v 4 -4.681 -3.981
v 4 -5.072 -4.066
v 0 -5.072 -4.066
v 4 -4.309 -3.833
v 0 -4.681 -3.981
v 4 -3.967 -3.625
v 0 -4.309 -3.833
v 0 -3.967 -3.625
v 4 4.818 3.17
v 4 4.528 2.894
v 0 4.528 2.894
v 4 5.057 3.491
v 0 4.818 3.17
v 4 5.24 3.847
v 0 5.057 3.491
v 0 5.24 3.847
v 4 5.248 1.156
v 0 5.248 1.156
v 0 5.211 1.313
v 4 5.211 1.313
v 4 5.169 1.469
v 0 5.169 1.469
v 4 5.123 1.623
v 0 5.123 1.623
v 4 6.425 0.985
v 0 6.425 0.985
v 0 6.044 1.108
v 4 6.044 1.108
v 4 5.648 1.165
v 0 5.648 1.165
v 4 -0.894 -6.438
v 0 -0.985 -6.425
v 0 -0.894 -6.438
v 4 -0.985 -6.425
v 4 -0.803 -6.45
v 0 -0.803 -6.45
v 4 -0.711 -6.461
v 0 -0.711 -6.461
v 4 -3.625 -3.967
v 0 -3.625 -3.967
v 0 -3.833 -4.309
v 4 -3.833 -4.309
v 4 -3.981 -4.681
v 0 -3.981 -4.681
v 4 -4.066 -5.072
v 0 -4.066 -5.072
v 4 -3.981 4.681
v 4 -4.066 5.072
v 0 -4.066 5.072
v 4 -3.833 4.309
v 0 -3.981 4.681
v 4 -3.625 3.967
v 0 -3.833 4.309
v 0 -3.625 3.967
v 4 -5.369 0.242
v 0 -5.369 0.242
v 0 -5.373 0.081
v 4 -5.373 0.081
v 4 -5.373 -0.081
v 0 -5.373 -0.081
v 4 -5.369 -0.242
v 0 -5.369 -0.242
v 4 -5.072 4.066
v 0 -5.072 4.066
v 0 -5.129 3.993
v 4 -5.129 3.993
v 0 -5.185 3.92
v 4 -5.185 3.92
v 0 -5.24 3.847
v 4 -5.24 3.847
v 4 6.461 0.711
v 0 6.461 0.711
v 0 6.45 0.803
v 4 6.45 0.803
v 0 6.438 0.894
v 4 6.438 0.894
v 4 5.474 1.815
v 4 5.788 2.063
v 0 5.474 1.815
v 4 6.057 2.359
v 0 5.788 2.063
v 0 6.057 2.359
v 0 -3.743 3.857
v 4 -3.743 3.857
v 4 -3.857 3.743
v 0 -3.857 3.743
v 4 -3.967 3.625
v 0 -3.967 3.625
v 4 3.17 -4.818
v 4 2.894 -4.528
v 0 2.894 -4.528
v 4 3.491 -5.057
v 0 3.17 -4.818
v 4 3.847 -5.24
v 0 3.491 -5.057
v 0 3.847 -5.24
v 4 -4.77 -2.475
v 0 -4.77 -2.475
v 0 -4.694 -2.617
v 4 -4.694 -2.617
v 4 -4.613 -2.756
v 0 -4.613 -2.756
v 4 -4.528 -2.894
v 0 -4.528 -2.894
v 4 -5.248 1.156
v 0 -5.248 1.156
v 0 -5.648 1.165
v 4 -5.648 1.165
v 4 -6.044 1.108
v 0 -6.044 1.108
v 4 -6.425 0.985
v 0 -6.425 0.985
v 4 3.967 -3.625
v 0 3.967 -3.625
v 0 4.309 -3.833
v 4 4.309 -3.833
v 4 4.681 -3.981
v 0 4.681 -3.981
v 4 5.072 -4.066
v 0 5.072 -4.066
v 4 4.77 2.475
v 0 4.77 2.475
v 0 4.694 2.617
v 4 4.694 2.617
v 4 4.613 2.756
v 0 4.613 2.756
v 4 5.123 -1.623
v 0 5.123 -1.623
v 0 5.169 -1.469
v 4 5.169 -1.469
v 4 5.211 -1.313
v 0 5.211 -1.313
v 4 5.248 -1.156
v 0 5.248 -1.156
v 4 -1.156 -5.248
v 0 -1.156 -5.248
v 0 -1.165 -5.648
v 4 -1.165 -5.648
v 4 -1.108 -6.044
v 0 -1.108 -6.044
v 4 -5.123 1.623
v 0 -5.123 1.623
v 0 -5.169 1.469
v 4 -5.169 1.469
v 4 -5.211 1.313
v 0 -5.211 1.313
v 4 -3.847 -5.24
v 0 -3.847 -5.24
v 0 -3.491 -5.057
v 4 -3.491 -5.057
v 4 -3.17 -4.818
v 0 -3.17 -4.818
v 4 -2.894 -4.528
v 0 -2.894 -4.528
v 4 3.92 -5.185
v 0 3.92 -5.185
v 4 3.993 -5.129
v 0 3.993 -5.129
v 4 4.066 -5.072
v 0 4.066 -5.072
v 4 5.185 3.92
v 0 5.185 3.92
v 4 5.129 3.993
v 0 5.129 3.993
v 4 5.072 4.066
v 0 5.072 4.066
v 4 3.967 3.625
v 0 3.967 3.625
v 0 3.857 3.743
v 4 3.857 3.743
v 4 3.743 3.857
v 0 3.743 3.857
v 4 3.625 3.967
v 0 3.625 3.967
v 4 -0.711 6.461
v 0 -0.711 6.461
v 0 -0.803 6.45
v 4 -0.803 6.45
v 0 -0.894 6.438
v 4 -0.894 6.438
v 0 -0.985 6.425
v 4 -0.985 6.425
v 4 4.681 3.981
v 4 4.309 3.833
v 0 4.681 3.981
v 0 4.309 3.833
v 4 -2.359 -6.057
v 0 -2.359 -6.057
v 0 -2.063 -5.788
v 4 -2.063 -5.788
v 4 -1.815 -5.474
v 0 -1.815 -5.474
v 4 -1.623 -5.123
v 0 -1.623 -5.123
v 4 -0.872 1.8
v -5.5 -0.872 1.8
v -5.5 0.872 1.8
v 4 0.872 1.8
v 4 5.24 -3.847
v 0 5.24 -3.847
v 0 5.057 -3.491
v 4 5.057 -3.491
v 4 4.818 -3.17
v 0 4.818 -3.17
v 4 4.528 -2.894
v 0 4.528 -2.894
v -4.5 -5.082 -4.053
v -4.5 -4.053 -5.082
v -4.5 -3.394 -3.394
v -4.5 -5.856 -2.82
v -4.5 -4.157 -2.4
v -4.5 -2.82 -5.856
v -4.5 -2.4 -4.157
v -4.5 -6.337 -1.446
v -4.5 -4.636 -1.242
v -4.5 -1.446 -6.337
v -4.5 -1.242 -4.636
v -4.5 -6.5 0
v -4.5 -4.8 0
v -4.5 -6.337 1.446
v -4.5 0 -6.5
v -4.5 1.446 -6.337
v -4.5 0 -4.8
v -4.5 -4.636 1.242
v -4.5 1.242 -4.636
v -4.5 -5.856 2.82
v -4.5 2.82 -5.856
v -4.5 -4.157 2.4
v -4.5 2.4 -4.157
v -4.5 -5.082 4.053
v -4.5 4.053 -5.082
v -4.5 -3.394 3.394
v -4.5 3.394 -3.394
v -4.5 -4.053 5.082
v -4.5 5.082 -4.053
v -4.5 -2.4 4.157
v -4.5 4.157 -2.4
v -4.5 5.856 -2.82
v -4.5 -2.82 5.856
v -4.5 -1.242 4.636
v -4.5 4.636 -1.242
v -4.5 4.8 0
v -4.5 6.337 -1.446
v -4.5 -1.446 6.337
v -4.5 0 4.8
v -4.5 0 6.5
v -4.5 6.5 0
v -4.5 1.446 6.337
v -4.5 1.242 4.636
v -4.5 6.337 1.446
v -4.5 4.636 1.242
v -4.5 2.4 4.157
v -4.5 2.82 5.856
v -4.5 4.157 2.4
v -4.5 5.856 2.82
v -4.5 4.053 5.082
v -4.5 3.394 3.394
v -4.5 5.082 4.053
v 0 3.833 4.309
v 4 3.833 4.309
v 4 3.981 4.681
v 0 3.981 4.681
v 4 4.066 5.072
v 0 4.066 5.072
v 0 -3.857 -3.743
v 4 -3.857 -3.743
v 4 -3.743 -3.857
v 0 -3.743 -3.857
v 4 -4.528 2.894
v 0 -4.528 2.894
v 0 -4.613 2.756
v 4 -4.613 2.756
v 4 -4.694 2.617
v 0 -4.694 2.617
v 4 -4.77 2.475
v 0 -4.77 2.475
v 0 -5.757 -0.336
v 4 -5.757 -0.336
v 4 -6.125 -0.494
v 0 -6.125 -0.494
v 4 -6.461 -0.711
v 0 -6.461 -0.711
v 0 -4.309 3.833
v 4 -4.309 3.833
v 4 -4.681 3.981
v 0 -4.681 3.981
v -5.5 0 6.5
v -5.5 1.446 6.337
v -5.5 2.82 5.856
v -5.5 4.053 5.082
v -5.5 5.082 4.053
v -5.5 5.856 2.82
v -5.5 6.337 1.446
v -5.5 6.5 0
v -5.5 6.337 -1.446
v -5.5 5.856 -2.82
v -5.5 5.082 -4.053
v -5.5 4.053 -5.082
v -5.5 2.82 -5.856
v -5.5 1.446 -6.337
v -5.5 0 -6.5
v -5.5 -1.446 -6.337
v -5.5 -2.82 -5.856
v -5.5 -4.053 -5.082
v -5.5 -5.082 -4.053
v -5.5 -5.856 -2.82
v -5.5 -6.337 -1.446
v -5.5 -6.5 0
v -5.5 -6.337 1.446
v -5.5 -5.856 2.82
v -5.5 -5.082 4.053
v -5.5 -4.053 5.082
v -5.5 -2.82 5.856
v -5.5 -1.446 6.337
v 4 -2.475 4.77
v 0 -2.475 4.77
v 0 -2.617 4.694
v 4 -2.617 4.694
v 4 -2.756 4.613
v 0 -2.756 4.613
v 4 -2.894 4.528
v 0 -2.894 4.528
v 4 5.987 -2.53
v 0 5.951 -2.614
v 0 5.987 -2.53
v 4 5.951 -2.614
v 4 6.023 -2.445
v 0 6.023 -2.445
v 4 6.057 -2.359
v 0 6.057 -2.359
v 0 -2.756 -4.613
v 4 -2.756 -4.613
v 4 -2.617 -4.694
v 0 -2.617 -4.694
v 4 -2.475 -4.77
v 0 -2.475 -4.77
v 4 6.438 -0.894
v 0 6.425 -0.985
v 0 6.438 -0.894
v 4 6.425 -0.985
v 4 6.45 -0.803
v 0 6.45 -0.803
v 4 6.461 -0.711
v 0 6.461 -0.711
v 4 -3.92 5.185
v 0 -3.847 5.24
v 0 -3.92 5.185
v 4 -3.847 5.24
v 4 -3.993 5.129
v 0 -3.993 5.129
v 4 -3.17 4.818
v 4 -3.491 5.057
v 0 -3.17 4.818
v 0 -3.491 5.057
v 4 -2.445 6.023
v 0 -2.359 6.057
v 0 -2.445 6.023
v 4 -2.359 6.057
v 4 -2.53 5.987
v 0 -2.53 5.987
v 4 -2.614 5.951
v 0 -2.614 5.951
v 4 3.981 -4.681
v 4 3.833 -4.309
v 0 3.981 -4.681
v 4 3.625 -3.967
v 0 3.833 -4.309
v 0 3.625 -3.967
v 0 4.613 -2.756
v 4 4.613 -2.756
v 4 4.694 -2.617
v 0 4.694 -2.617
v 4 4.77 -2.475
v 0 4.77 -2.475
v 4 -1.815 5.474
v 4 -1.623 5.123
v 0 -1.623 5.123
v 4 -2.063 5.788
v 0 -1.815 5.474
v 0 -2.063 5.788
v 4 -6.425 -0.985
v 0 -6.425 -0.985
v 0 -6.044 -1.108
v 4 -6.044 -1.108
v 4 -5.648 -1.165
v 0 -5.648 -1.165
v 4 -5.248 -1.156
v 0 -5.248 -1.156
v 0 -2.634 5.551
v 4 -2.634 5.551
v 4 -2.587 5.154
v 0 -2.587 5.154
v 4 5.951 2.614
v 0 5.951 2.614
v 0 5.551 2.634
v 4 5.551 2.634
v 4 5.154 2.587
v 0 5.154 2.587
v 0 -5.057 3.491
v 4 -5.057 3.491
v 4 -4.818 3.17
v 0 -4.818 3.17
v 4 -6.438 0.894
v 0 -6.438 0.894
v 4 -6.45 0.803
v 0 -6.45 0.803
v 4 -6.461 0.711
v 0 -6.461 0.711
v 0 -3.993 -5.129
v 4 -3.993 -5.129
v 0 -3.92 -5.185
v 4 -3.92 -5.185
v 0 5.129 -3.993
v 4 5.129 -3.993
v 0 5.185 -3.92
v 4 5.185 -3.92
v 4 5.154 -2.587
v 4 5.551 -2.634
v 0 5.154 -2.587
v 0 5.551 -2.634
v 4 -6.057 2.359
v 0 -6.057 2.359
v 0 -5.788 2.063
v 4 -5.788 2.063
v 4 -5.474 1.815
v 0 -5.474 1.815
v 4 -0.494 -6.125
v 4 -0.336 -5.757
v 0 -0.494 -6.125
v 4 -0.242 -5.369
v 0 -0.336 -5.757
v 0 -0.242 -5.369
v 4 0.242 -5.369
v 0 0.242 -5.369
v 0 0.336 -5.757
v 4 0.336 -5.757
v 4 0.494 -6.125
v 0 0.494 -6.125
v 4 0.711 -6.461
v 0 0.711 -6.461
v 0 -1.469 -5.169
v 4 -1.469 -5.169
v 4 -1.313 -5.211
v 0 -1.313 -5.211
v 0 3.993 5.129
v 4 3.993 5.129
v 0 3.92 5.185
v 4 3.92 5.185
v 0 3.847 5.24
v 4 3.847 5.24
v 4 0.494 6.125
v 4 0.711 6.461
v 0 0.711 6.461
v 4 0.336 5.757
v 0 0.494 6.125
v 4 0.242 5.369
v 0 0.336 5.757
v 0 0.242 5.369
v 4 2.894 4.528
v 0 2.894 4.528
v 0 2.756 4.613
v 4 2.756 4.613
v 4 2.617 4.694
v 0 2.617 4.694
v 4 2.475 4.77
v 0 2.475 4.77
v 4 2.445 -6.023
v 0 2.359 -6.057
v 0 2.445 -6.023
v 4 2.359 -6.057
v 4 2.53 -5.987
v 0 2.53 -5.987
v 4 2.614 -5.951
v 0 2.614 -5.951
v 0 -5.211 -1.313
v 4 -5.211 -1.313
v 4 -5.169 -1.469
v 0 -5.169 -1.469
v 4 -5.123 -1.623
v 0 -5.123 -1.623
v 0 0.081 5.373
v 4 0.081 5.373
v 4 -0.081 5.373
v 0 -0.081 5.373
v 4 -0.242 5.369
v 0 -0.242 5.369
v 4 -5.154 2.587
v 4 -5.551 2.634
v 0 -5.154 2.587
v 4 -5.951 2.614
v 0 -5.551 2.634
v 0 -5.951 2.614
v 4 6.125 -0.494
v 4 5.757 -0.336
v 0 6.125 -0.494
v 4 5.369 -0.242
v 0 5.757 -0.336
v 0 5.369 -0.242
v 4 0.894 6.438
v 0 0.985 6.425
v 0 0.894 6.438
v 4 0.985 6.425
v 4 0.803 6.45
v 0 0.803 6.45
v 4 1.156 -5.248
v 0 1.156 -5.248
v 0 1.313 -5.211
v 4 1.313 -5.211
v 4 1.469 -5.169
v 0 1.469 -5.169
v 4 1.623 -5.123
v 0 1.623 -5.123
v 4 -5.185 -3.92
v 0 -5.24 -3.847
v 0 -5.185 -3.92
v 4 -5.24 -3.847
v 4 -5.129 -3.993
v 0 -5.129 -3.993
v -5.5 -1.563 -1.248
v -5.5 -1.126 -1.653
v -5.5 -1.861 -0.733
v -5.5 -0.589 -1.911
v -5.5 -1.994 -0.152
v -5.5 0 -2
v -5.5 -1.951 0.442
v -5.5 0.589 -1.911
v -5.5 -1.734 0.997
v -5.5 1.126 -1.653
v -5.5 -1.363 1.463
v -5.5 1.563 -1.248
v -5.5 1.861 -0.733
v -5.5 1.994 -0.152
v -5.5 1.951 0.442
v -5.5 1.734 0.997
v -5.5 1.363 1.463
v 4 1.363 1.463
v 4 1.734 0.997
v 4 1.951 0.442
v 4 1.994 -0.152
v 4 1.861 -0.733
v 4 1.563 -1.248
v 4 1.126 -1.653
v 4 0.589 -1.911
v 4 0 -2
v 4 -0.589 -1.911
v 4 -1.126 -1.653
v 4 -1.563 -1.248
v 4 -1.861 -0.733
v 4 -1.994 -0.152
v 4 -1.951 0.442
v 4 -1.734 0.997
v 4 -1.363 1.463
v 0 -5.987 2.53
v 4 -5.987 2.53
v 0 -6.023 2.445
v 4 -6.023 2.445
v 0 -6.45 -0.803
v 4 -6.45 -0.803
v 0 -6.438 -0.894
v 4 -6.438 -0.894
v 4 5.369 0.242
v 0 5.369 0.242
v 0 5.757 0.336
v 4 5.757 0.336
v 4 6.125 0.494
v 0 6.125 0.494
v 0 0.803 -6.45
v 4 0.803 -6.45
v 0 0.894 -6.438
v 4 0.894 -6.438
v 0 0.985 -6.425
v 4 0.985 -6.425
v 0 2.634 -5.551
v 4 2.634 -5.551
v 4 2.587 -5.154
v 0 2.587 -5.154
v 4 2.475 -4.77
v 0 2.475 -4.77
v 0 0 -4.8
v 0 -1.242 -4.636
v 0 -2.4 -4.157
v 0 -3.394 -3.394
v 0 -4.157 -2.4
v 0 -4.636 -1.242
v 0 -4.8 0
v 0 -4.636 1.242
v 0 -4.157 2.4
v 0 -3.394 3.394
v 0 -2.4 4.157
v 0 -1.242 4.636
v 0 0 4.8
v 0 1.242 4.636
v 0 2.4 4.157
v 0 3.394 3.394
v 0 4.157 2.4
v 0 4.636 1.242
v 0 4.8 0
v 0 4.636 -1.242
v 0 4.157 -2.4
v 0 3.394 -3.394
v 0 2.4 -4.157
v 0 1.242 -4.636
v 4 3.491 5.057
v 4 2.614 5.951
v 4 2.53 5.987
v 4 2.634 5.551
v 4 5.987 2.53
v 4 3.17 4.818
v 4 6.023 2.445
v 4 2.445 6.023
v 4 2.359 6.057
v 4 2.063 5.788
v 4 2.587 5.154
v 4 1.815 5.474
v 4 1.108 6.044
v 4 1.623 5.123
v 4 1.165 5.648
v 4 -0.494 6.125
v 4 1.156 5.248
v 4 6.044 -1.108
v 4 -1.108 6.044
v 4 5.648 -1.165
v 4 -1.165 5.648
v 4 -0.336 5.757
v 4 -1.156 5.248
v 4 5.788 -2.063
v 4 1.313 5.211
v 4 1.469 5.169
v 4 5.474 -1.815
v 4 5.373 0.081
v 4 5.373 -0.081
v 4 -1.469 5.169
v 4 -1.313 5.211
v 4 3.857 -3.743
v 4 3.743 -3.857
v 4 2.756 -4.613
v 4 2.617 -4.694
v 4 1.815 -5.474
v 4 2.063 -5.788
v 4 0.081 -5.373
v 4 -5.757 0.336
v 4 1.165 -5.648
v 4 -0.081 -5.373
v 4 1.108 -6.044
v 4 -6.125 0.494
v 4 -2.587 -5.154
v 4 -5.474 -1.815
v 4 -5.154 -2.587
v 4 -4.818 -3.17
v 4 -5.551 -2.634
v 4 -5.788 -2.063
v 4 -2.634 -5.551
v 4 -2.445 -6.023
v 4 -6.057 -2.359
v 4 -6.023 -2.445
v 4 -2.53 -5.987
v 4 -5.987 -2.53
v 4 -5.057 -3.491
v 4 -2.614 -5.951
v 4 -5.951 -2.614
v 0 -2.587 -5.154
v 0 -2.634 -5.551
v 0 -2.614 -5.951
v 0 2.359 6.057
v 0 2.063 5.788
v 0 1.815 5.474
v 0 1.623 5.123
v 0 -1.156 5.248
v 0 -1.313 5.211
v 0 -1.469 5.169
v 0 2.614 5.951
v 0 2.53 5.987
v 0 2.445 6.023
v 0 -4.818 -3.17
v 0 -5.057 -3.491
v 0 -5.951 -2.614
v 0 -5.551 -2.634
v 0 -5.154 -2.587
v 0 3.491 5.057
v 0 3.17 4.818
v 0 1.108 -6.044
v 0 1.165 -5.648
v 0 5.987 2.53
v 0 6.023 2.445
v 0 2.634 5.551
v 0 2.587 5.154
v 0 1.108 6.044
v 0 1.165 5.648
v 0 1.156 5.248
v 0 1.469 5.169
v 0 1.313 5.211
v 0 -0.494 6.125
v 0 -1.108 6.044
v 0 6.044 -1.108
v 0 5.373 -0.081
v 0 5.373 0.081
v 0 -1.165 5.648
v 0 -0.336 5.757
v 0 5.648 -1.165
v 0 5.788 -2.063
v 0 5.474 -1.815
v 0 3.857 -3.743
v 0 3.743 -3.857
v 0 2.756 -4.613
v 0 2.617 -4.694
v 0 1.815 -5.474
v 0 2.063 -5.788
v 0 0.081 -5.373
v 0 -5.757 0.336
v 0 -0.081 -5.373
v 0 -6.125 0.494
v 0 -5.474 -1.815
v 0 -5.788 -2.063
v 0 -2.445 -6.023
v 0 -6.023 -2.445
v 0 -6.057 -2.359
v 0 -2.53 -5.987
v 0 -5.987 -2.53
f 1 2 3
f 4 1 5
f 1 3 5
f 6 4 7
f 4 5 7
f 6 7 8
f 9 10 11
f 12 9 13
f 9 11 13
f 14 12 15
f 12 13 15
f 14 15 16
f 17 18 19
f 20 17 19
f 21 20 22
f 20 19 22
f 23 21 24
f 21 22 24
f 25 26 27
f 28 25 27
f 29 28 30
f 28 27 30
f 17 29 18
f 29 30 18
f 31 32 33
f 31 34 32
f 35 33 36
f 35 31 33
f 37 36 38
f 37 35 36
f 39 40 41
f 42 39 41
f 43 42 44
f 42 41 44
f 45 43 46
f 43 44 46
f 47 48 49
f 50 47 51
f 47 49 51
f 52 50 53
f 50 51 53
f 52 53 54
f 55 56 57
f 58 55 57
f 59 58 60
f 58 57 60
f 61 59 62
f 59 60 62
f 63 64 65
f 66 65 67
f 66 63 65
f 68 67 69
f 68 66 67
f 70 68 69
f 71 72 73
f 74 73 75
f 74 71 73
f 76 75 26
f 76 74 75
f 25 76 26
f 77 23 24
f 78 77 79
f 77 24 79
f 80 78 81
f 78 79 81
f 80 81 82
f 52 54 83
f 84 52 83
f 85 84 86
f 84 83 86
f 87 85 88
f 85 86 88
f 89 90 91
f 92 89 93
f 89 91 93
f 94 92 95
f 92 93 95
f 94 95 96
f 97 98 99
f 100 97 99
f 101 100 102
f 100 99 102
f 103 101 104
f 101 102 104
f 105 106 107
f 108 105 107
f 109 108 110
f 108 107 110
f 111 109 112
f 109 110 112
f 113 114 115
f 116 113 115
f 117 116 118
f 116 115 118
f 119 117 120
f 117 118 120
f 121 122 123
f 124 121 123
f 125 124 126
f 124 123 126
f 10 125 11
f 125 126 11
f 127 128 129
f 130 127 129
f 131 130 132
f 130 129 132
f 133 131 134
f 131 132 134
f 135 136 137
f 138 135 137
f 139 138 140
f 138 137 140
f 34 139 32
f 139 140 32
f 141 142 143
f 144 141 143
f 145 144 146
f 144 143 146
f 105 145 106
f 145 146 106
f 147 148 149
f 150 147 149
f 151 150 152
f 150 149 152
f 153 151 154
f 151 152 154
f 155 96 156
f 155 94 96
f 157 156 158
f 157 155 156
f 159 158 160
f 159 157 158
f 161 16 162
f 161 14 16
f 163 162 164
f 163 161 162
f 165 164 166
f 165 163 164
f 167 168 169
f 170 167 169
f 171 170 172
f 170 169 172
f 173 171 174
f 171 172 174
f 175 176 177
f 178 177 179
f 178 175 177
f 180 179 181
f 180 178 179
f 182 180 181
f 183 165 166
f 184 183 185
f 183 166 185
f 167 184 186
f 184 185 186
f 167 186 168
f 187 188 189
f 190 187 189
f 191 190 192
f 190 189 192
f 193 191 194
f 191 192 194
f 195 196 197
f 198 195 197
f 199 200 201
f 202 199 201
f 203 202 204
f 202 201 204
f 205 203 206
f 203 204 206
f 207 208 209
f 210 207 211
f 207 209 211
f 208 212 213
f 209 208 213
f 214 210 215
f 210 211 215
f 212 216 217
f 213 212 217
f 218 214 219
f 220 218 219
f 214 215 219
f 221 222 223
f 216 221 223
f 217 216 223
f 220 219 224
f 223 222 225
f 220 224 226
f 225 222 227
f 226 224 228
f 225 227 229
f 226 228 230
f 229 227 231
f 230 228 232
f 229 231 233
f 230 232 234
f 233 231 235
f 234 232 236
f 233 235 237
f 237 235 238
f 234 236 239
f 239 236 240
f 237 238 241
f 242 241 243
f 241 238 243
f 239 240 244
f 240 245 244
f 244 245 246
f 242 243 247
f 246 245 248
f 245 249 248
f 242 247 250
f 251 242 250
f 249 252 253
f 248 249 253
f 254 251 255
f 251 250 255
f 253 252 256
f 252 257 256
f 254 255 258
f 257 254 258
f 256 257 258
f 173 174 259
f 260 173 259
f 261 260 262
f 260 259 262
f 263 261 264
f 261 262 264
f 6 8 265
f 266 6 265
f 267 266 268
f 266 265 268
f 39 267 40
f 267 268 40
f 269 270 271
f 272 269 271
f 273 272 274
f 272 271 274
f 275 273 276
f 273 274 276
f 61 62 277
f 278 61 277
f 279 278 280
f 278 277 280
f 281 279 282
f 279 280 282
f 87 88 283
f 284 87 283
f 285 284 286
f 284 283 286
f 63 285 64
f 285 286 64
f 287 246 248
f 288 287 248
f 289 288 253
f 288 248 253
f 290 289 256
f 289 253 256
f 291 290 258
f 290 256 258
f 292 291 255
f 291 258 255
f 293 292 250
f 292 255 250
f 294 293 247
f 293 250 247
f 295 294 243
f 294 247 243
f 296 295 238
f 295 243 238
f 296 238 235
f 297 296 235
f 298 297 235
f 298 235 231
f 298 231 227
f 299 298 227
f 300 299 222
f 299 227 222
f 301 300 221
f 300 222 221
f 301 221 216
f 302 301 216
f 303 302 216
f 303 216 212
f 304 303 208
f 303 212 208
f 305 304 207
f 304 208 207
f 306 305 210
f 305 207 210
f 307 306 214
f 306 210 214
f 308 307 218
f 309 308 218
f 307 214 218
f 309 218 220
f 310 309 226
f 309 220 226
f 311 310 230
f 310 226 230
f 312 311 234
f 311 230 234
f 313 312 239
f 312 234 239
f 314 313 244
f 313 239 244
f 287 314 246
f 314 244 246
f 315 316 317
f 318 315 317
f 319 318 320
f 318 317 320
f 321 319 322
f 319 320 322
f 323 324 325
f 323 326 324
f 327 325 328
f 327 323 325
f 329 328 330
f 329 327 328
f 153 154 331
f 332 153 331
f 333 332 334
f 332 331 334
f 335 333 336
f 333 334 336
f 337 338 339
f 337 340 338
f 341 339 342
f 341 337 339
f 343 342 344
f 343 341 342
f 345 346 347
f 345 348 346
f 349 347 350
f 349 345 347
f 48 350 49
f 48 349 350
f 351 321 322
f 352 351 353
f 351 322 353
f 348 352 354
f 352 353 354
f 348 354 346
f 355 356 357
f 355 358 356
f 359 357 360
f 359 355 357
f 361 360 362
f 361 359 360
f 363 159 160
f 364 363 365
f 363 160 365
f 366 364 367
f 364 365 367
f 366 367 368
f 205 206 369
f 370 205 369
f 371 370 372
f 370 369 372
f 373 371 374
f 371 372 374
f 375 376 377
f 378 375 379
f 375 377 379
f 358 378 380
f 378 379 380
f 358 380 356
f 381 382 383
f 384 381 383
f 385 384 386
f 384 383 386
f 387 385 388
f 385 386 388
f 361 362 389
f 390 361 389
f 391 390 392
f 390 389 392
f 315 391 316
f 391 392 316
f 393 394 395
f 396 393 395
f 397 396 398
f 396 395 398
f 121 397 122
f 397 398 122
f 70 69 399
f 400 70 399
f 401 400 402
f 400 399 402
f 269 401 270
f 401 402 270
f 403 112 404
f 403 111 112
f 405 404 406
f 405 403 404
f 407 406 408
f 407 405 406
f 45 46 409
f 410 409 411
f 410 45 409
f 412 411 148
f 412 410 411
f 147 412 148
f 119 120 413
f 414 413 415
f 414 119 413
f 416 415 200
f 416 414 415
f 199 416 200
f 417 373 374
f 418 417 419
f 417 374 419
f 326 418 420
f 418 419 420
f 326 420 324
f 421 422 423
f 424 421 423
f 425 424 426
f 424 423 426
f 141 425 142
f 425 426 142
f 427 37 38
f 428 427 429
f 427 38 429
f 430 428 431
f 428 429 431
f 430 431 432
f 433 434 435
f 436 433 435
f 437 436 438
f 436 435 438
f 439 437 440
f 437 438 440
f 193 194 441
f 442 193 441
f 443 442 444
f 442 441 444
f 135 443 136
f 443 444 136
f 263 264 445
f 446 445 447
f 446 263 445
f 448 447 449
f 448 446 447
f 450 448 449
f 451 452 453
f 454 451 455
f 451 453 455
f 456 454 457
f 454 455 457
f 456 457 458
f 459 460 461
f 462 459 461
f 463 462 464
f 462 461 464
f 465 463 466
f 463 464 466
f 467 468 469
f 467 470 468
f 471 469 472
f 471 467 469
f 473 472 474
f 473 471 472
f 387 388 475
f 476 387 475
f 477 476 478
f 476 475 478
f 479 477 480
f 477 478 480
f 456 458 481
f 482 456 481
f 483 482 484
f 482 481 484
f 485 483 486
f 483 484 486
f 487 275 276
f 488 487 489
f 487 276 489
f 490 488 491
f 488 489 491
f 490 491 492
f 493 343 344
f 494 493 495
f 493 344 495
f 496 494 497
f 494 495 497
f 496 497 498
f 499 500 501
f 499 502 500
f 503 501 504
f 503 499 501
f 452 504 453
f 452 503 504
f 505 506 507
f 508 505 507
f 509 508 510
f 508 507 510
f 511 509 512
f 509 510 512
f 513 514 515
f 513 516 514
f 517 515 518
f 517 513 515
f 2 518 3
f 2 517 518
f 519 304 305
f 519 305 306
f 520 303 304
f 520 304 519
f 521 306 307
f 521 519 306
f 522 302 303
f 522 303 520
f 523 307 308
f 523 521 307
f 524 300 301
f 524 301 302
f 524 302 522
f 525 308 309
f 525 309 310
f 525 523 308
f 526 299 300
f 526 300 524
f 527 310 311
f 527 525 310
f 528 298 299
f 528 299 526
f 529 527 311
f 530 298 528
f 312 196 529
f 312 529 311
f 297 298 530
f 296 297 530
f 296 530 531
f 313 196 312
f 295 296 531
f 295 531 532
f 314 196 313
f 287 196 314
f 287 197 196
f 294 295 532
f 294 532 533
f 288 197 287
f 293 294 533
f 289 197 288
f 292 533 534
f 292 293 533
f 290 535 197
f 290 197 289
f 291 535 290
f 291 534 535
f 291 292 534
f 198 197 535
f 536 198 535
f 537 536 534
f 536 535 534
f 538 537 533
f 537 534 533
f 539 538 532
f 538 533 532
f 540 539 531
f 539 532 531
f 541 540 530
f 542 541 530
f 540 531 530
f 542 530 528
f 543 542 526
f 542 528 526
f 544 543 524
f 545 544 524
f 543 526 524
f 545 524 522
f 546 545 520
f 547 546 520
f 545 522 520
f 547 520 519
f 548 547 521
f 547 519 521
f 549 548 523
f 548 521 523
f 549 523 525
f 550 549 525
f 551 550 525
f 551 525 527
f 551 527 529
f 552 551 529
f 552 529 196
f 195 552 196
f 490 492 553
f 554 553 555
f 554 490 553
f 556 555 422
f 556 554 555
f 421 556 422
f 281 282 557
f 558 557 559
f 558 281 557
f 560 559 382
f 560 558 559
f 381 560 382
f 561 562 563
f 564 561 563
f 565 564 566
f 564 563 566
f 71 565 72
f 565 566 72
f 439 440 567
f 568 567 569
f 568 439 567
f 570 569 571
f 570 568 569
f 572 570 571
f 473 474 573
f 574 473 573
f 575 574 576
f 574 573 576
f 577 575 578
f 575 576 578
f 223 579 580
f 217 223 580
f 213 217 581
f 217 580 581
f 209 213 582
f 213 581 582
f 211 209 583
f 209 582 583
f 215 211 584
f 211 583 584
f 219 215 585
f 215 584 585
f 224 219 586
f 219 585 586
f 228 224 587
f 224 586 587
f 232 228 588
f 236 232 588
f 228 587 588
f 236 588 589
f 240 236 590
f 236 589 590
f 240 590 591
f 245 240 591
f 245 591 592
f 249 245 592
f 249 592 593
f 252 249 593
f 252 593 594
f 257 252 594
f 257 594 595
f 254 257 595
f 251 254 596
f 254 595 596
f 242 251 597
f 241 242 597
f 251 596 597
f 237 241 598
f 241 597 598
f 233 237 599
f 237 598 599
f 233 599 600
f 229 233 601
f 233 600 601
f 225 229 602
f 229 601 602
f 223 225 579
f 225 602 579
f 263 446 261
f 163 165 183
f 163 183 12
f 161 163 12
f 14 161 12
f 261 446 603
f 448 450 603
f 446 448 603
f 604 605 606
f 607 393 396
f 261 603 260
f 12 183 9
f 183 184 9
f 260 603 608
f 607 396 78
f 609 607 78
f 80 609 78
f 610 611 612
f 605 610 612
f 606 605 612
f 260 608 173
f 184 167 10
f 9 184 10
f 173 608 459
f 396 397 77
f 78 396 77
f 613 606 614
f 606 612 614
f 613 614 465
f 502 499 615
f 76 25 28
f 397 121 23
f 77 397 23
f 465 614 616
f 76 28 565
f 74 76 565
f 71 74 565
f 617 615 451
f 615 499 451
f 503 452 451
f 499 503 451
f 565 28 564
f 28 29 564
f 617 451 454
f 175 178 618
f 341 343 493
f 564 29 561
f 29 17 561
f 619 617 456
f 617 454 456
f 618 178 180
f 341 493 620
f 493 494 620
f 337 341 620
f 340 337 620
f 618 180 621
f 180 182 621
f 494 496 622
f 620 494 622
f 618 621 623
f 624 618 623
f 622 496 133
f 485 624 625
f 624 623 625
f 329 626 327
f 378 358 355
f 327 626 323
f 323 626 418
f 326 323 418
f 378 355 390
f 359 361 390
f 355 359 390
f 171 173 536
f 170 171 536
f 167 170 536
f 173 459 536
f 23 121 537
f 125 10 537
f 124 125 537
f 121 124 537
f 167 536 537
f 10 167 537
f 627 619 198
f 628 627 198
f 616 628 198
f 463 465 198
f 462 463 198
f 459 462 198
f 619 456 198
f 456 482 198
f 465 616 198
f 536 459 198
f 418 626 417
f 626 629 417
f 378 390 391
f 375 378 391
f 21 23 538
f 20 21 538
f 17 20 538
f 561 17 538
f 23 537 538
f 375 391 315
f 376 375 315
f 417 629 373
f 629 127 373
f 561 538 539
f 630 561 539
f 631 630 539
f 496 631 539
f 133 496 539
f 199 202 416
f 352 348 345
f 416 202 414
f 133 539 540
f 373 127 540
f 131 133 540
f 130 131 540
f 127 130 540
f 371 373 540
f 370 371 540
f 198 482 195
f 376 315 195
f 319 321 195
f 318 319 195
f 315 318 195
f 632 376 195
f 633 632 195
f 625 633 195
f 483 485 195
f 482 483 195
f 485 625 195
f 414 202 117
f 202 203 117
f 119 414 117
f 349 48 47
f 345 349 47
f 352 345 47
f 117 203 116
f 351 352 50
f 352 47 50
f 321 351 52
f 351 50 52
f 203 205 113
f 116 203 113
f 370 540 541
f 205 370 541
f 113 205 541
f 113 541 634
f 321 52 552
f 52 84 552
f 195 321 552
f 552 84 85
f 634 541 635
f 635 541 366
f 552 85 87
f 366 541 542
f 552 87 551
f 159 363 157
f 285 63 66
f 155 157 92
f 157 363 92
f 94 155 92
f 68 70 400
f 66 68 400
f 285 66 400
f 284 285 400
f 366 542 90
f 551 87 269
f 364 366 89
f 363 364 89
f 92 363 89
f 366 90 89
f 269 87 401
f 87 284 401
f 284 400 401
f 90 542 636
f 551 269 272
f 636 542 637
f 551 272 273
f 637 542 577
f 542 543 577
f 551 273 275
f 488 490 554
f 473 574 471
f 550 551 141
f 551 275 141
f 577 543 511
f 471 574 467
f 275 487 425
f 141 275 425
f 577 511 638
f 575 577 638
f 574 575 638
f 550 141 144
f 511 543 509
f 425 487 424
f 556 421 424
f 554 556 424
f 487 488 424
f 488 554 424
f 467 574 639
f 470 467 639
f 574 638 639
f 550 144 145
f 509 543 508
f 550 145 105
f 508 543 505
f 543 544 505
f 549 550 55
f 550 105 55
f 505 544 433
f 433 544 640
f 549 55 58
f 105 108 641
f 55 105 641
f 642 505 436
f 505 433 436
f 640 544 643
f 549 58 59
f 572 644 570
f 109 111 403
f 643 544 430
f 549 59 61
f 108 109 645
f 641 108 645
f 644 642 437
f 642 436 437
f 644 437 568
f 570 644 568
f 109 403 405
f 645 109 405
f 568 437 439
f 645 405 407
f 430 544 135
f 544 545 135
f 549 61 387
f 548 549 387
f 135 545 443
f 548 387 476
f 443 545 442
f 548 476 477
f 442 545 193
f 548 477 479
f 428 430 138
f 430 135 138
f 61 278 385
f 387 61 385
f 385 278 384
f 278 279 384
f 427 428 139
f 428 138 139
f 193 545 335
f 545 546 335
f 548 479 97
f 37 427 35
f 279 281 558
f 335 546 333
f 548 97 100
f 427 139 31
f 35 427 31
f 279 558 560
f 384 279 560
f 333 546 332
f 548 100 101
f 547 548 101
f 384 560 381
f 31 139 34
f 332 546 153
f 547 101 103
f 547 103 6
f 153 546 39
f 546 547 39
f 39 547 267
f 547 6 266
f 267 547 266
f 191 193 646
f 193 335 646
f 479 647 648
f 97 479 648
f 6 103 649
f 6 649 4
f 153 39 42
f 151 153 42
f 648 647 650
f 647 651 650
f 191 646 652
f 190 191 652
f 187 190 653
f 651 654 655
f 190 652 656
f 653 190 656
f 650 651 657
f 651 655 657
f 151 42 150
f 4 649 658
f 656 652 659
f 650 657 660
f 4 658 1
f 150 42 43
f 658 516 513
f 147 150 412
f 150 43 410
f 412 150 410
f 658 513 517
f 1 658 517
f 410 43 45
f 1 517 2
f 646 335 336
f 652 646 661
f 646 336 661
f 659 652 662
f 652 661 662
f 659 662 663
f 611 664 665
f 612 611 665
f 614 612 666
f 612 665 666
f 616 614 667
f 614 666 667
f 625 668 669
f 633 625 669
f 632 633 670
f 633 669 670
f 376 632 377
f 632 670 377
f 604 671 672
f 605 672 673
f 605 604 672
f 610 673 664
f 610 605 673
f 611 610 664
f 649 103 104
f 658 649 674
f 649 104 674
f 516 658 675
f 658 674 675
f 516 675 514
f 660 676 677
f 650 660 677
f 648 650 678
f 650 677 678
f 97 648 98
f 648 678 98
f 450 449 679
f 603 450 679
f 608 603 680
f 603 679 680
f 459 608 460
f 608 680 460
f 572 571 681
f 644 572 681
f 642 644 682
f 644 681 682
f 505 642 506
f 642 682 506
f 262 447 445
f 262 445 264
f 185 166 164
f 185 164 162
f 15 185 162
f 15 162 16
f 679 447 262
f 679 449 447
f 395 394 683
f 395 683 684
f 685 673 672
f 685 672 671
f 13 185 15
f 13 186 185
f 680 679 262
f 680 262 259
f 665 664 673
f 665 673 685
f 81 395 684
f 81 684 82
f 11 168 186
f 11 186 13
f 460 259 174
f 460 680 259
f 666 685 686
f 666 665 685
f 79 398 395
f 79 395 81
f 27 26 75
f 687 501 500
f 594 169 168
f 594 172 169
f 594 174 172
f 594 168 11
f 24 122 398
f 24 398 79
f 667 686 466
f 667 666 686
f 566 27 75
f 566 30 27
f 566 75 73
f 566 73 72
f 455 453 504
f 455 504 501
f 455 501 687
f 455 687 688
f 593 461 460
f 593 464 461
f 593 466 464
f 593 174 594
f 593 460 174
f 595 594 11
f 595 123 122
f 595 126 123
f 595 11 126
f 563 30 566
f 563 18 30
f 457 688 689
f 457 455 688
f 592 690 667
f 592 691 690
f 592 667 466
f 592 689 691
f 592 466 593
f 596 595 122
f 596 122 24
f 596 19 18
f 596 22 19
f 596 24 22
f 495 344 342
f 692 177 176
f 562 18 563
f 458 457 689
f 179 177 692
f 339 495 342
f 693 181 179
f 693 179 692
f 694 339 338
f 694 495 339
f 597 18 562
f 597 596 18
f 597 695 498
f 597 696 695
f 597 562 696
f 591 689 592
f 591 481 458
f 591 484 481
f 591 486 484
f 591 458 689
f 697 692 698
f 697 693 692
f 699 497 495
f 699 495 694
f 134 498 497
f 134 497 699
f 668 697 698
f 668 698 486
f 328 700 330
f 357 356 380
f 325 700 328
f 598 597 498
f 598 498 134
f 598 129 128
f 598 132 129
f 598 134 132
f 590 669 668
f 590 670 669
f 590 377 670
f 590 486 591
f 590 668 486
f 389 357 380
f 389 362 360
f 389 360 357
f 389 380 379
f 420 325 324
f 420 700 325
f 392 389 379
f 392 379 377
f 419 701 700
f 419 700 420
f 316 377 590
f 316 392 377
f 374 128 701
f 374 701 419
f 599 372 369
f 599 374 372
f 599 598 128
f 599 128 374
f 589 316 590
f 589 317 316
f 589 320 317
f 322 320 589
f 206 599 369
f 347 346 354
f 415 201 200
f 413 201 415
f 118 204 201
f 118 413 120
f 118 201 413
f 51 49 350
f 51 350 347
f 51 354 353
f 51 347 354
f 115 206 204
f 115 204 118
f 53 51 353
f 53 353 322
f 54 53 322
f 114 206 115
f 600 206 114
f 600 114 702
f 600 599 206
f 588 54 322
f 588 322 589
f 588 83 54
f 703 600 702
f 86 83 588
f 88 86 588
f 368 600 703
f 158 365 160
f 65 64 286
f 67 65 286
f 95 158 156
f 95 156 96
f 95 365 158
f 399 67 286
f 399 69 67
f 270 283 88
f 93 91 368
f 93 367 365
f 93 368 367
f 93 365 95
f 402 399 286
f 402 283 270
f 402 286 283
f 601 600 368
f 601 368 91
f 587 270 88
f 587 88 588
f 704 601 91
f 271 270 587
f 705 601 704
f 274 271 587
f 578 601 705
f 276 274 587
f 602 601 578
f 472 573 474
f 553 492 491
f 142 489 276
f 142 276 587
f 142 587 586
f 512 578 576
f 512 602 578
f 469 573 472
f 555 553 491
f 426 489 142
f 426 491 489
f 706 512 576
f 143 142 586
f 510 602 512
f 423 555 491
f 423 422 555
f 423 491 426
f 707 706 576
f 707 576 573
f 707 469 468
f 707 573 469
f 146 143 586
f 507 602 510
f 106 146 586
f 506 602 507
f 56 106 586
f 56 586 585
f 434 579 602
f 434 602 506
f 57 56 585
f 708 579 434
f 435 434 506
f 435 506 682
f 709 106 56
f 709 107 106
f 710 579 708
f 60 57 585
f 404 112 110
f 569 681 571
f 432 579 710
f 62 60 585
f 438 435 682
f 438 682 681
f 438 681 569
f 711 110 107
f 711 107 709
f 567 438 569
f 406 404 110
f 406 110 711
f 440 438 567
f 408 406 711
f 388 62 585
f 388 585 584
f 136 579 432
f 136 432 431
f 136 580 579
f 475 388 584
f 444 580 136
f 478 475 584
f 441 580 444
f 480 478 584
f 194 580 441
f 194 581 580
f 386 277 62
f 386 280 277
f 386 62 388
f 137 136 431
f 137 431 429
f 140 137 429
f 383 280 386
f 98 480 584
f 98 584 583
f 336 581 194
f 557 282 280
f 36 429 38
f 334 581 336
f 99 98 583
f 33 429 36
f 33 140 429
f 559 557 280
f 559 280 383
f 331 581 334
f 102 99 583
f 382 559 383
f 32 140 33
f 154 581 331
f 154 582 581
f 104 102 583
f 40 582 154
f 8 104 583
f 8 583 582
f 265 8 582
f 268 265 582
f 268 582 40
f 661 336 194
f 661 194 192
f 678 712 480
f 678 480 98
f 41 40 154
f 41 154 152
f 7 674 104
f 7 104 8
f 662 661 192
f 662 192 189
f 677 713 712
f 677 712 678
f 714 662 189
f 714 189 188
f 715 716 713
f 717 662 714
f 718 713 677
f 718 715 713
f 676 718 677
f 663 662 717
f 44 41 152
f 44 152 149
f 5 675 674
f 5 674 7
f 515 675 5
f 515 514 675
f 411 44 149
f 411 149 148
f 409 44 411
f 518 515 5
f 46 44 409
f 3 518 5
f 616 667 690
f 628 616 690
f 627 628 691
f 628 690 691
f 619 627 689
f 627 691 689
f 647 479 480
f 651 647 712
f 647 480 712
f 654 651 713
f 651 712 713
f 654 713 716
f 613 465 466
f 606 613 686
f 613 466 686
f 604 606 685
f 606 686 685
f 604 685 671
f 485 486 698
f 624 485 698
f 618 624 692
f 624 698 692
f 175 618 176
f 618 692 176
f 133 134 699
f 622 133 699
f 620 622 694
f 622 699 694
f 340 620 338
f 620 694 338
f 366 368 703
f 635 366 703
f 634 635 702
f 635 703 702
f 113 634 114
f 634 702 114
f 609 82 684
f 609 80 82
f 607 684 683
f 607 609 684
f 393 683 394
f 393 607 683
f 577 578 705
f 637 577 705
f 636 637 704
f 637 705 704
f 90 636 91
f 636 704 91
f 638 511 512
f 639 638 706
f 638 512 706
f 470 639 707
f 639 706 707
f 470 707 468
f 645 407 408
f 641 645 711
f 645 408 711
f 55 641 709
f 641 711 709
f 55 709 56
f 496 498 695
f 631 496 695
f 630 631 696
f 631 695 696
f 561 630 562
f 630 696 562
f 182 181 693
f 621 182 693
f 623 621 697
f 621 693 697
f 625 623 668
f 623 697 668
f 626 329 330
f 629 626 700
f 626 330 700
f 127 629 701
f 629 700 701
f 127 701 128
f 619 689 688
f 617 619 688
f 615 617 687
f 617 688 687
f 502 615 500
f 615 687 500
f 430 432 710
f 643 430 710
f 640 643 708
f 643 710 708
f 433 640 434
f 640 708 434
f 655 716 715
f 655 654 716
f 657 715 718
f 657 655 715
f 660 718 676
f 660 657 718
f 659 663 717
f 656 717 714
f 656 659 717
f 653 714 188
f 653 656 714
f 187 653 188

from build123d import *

# Parameters (mm, degrees)
BASPROSKE_W         = 4
BASPROSKE_H         = 6.5
TOOTHCUT_DEPTH      = 11.024968828
TEETHCUTS_COUNT     = 24
TEETHCUTS_ANGLE     = 345
BORSKE_R            = 1.5
BORE_DEPTH          = 50.0000508
SKETCH_1_R          = 4.8
SKETCH_1_R_2        = 1.5
EXTRUDE_1_DEPTH     = 4.5
SKETCH_2_R          = 6.5
SKETCH_2_R_2        = 1.5
EXTRUDE_2_DEPTH     = 1
CUT_EXTRUDE_1_REACH = 15.219


with BuildPart() as part:
    # BasProSke → Base-Revolve (revolve)
    with BuildSketch(Plane(origin=(0, 0, 0), x_dir=(1, 0, 0), z_dir=(0, 1, 0)), mode=Mode.PRIVATE) as base_revolve_sk:
        with Locations((2, 3.25)):
            Rectangle(BASPROSKE_W, BASPROSKE_H)
    revolve(base_revolve_sk.sketch.rotate(Axis((-10, 0, 0), (1, 0, 0)), 180), axis=Axis((-10, 0, 0), (1, 0, 0)))

    # TooCutSke → ToothCut (cut, through all)
    with BuildSketch(Plane(origin=(0, 0, 0), x_dir=(0, 0, -1), z_dir=(1, 0, 0))):
        with BuildLine():
            ThreePointArc((0.241646108, 5.368564348), (0, 5.374), (-0.241646108, 5.368564348))
            ThreePointArc((-0.241646108, 5.368564348), (-0.413699957, 5.957993365), (-0.729686037, 6.48447403))
            ThreePointArc((-0.729686037, 6.48447403), (0, 6.5254), (0.729686037, 6.48447403))
            ThreePointArc((0.729686037, 6.48447403), (0.413699957, 5.957993365), (0.241646108, 5.368564348))
        make_face()
    toothcut = extrude(amount=TOOTHCUT_DEPTH, mode=Mode.SUBTRACT)

    # TeethCuts: ToothCut ×24 about axis
    teethcuts_axis = Axis((-10, 0, 0), (1, 0, 0))
    for i in range(1, TEETHCUTS_COUNT):
        add(toothcut.rotate(teethcuts_axis, i * TEETHCUTS_ANGLE / (TEETHCUTS_COUNT - 1)), mode=Mode.SUBTRACT)

    # BorSke → Bore (cut, symmetric)
    with BuildSketch(Plane(origin=(0, 0, 0), x_dir=(0, 0, -1), z_dir=(1, 0, 0))):
        with Locations(Location((0, 0, 0), (0, 0, 180))):
            Circle(BORSKE_R)
    extrude(amount=BORE_DEPTH, both=True, mode=Mode.SUBTRACT)

    # 草图1 → 凸台-拉伸1 (add)
    with BuildSketch(Plane.ZY):
        with Locations(Location((0, 0, 0), (0, 0, 180))):
            Circle(SKETCH_1_R)
        Circle(SKETCH_1_R_2, mode=Mode.SUBTRACT)
    extrude(amount=EXTRUDE_1_DEPTH)

    # 草图2 → 凸台-拉伸2 (add)
    with BuildSketch(Plane.ZY.offset(4.5)):
        Circle(SKETCH_2_R)
        Circle(SKETCH_2_R_2, mode=Mode.SUBTRACT)
    extrude(amount=EXTRUDE_2_DEPTH)

    # 草图3 → 切除-拉伸1 (cut, up to next)
    with BuildSketch(Plane.ZY.offset(5.5), mode=Mode.PRIVATE) as cut_extrude_1_sk1:
        with BuildLine():
            Line((1.8, -0.871779789), (1.8, 0.871779789))
            ThreePointArc((1.8, 0.871779789), (-2, 0), (1.8, -0.871779789))
        make_face()
    cut_extrude_1_tool1 = extrude(cut_extrude_1_sk1.sketch, amount=-CUT_EXTRUDE_1_REACH, mode=Mode.PRIVATE) & part.part
    add(cut_extrude_1_tool1.solids().sort_by_distance((-5.5, 0, -0.035819))[0], mode=Mode.SUBTRACT)


solid = part.part
